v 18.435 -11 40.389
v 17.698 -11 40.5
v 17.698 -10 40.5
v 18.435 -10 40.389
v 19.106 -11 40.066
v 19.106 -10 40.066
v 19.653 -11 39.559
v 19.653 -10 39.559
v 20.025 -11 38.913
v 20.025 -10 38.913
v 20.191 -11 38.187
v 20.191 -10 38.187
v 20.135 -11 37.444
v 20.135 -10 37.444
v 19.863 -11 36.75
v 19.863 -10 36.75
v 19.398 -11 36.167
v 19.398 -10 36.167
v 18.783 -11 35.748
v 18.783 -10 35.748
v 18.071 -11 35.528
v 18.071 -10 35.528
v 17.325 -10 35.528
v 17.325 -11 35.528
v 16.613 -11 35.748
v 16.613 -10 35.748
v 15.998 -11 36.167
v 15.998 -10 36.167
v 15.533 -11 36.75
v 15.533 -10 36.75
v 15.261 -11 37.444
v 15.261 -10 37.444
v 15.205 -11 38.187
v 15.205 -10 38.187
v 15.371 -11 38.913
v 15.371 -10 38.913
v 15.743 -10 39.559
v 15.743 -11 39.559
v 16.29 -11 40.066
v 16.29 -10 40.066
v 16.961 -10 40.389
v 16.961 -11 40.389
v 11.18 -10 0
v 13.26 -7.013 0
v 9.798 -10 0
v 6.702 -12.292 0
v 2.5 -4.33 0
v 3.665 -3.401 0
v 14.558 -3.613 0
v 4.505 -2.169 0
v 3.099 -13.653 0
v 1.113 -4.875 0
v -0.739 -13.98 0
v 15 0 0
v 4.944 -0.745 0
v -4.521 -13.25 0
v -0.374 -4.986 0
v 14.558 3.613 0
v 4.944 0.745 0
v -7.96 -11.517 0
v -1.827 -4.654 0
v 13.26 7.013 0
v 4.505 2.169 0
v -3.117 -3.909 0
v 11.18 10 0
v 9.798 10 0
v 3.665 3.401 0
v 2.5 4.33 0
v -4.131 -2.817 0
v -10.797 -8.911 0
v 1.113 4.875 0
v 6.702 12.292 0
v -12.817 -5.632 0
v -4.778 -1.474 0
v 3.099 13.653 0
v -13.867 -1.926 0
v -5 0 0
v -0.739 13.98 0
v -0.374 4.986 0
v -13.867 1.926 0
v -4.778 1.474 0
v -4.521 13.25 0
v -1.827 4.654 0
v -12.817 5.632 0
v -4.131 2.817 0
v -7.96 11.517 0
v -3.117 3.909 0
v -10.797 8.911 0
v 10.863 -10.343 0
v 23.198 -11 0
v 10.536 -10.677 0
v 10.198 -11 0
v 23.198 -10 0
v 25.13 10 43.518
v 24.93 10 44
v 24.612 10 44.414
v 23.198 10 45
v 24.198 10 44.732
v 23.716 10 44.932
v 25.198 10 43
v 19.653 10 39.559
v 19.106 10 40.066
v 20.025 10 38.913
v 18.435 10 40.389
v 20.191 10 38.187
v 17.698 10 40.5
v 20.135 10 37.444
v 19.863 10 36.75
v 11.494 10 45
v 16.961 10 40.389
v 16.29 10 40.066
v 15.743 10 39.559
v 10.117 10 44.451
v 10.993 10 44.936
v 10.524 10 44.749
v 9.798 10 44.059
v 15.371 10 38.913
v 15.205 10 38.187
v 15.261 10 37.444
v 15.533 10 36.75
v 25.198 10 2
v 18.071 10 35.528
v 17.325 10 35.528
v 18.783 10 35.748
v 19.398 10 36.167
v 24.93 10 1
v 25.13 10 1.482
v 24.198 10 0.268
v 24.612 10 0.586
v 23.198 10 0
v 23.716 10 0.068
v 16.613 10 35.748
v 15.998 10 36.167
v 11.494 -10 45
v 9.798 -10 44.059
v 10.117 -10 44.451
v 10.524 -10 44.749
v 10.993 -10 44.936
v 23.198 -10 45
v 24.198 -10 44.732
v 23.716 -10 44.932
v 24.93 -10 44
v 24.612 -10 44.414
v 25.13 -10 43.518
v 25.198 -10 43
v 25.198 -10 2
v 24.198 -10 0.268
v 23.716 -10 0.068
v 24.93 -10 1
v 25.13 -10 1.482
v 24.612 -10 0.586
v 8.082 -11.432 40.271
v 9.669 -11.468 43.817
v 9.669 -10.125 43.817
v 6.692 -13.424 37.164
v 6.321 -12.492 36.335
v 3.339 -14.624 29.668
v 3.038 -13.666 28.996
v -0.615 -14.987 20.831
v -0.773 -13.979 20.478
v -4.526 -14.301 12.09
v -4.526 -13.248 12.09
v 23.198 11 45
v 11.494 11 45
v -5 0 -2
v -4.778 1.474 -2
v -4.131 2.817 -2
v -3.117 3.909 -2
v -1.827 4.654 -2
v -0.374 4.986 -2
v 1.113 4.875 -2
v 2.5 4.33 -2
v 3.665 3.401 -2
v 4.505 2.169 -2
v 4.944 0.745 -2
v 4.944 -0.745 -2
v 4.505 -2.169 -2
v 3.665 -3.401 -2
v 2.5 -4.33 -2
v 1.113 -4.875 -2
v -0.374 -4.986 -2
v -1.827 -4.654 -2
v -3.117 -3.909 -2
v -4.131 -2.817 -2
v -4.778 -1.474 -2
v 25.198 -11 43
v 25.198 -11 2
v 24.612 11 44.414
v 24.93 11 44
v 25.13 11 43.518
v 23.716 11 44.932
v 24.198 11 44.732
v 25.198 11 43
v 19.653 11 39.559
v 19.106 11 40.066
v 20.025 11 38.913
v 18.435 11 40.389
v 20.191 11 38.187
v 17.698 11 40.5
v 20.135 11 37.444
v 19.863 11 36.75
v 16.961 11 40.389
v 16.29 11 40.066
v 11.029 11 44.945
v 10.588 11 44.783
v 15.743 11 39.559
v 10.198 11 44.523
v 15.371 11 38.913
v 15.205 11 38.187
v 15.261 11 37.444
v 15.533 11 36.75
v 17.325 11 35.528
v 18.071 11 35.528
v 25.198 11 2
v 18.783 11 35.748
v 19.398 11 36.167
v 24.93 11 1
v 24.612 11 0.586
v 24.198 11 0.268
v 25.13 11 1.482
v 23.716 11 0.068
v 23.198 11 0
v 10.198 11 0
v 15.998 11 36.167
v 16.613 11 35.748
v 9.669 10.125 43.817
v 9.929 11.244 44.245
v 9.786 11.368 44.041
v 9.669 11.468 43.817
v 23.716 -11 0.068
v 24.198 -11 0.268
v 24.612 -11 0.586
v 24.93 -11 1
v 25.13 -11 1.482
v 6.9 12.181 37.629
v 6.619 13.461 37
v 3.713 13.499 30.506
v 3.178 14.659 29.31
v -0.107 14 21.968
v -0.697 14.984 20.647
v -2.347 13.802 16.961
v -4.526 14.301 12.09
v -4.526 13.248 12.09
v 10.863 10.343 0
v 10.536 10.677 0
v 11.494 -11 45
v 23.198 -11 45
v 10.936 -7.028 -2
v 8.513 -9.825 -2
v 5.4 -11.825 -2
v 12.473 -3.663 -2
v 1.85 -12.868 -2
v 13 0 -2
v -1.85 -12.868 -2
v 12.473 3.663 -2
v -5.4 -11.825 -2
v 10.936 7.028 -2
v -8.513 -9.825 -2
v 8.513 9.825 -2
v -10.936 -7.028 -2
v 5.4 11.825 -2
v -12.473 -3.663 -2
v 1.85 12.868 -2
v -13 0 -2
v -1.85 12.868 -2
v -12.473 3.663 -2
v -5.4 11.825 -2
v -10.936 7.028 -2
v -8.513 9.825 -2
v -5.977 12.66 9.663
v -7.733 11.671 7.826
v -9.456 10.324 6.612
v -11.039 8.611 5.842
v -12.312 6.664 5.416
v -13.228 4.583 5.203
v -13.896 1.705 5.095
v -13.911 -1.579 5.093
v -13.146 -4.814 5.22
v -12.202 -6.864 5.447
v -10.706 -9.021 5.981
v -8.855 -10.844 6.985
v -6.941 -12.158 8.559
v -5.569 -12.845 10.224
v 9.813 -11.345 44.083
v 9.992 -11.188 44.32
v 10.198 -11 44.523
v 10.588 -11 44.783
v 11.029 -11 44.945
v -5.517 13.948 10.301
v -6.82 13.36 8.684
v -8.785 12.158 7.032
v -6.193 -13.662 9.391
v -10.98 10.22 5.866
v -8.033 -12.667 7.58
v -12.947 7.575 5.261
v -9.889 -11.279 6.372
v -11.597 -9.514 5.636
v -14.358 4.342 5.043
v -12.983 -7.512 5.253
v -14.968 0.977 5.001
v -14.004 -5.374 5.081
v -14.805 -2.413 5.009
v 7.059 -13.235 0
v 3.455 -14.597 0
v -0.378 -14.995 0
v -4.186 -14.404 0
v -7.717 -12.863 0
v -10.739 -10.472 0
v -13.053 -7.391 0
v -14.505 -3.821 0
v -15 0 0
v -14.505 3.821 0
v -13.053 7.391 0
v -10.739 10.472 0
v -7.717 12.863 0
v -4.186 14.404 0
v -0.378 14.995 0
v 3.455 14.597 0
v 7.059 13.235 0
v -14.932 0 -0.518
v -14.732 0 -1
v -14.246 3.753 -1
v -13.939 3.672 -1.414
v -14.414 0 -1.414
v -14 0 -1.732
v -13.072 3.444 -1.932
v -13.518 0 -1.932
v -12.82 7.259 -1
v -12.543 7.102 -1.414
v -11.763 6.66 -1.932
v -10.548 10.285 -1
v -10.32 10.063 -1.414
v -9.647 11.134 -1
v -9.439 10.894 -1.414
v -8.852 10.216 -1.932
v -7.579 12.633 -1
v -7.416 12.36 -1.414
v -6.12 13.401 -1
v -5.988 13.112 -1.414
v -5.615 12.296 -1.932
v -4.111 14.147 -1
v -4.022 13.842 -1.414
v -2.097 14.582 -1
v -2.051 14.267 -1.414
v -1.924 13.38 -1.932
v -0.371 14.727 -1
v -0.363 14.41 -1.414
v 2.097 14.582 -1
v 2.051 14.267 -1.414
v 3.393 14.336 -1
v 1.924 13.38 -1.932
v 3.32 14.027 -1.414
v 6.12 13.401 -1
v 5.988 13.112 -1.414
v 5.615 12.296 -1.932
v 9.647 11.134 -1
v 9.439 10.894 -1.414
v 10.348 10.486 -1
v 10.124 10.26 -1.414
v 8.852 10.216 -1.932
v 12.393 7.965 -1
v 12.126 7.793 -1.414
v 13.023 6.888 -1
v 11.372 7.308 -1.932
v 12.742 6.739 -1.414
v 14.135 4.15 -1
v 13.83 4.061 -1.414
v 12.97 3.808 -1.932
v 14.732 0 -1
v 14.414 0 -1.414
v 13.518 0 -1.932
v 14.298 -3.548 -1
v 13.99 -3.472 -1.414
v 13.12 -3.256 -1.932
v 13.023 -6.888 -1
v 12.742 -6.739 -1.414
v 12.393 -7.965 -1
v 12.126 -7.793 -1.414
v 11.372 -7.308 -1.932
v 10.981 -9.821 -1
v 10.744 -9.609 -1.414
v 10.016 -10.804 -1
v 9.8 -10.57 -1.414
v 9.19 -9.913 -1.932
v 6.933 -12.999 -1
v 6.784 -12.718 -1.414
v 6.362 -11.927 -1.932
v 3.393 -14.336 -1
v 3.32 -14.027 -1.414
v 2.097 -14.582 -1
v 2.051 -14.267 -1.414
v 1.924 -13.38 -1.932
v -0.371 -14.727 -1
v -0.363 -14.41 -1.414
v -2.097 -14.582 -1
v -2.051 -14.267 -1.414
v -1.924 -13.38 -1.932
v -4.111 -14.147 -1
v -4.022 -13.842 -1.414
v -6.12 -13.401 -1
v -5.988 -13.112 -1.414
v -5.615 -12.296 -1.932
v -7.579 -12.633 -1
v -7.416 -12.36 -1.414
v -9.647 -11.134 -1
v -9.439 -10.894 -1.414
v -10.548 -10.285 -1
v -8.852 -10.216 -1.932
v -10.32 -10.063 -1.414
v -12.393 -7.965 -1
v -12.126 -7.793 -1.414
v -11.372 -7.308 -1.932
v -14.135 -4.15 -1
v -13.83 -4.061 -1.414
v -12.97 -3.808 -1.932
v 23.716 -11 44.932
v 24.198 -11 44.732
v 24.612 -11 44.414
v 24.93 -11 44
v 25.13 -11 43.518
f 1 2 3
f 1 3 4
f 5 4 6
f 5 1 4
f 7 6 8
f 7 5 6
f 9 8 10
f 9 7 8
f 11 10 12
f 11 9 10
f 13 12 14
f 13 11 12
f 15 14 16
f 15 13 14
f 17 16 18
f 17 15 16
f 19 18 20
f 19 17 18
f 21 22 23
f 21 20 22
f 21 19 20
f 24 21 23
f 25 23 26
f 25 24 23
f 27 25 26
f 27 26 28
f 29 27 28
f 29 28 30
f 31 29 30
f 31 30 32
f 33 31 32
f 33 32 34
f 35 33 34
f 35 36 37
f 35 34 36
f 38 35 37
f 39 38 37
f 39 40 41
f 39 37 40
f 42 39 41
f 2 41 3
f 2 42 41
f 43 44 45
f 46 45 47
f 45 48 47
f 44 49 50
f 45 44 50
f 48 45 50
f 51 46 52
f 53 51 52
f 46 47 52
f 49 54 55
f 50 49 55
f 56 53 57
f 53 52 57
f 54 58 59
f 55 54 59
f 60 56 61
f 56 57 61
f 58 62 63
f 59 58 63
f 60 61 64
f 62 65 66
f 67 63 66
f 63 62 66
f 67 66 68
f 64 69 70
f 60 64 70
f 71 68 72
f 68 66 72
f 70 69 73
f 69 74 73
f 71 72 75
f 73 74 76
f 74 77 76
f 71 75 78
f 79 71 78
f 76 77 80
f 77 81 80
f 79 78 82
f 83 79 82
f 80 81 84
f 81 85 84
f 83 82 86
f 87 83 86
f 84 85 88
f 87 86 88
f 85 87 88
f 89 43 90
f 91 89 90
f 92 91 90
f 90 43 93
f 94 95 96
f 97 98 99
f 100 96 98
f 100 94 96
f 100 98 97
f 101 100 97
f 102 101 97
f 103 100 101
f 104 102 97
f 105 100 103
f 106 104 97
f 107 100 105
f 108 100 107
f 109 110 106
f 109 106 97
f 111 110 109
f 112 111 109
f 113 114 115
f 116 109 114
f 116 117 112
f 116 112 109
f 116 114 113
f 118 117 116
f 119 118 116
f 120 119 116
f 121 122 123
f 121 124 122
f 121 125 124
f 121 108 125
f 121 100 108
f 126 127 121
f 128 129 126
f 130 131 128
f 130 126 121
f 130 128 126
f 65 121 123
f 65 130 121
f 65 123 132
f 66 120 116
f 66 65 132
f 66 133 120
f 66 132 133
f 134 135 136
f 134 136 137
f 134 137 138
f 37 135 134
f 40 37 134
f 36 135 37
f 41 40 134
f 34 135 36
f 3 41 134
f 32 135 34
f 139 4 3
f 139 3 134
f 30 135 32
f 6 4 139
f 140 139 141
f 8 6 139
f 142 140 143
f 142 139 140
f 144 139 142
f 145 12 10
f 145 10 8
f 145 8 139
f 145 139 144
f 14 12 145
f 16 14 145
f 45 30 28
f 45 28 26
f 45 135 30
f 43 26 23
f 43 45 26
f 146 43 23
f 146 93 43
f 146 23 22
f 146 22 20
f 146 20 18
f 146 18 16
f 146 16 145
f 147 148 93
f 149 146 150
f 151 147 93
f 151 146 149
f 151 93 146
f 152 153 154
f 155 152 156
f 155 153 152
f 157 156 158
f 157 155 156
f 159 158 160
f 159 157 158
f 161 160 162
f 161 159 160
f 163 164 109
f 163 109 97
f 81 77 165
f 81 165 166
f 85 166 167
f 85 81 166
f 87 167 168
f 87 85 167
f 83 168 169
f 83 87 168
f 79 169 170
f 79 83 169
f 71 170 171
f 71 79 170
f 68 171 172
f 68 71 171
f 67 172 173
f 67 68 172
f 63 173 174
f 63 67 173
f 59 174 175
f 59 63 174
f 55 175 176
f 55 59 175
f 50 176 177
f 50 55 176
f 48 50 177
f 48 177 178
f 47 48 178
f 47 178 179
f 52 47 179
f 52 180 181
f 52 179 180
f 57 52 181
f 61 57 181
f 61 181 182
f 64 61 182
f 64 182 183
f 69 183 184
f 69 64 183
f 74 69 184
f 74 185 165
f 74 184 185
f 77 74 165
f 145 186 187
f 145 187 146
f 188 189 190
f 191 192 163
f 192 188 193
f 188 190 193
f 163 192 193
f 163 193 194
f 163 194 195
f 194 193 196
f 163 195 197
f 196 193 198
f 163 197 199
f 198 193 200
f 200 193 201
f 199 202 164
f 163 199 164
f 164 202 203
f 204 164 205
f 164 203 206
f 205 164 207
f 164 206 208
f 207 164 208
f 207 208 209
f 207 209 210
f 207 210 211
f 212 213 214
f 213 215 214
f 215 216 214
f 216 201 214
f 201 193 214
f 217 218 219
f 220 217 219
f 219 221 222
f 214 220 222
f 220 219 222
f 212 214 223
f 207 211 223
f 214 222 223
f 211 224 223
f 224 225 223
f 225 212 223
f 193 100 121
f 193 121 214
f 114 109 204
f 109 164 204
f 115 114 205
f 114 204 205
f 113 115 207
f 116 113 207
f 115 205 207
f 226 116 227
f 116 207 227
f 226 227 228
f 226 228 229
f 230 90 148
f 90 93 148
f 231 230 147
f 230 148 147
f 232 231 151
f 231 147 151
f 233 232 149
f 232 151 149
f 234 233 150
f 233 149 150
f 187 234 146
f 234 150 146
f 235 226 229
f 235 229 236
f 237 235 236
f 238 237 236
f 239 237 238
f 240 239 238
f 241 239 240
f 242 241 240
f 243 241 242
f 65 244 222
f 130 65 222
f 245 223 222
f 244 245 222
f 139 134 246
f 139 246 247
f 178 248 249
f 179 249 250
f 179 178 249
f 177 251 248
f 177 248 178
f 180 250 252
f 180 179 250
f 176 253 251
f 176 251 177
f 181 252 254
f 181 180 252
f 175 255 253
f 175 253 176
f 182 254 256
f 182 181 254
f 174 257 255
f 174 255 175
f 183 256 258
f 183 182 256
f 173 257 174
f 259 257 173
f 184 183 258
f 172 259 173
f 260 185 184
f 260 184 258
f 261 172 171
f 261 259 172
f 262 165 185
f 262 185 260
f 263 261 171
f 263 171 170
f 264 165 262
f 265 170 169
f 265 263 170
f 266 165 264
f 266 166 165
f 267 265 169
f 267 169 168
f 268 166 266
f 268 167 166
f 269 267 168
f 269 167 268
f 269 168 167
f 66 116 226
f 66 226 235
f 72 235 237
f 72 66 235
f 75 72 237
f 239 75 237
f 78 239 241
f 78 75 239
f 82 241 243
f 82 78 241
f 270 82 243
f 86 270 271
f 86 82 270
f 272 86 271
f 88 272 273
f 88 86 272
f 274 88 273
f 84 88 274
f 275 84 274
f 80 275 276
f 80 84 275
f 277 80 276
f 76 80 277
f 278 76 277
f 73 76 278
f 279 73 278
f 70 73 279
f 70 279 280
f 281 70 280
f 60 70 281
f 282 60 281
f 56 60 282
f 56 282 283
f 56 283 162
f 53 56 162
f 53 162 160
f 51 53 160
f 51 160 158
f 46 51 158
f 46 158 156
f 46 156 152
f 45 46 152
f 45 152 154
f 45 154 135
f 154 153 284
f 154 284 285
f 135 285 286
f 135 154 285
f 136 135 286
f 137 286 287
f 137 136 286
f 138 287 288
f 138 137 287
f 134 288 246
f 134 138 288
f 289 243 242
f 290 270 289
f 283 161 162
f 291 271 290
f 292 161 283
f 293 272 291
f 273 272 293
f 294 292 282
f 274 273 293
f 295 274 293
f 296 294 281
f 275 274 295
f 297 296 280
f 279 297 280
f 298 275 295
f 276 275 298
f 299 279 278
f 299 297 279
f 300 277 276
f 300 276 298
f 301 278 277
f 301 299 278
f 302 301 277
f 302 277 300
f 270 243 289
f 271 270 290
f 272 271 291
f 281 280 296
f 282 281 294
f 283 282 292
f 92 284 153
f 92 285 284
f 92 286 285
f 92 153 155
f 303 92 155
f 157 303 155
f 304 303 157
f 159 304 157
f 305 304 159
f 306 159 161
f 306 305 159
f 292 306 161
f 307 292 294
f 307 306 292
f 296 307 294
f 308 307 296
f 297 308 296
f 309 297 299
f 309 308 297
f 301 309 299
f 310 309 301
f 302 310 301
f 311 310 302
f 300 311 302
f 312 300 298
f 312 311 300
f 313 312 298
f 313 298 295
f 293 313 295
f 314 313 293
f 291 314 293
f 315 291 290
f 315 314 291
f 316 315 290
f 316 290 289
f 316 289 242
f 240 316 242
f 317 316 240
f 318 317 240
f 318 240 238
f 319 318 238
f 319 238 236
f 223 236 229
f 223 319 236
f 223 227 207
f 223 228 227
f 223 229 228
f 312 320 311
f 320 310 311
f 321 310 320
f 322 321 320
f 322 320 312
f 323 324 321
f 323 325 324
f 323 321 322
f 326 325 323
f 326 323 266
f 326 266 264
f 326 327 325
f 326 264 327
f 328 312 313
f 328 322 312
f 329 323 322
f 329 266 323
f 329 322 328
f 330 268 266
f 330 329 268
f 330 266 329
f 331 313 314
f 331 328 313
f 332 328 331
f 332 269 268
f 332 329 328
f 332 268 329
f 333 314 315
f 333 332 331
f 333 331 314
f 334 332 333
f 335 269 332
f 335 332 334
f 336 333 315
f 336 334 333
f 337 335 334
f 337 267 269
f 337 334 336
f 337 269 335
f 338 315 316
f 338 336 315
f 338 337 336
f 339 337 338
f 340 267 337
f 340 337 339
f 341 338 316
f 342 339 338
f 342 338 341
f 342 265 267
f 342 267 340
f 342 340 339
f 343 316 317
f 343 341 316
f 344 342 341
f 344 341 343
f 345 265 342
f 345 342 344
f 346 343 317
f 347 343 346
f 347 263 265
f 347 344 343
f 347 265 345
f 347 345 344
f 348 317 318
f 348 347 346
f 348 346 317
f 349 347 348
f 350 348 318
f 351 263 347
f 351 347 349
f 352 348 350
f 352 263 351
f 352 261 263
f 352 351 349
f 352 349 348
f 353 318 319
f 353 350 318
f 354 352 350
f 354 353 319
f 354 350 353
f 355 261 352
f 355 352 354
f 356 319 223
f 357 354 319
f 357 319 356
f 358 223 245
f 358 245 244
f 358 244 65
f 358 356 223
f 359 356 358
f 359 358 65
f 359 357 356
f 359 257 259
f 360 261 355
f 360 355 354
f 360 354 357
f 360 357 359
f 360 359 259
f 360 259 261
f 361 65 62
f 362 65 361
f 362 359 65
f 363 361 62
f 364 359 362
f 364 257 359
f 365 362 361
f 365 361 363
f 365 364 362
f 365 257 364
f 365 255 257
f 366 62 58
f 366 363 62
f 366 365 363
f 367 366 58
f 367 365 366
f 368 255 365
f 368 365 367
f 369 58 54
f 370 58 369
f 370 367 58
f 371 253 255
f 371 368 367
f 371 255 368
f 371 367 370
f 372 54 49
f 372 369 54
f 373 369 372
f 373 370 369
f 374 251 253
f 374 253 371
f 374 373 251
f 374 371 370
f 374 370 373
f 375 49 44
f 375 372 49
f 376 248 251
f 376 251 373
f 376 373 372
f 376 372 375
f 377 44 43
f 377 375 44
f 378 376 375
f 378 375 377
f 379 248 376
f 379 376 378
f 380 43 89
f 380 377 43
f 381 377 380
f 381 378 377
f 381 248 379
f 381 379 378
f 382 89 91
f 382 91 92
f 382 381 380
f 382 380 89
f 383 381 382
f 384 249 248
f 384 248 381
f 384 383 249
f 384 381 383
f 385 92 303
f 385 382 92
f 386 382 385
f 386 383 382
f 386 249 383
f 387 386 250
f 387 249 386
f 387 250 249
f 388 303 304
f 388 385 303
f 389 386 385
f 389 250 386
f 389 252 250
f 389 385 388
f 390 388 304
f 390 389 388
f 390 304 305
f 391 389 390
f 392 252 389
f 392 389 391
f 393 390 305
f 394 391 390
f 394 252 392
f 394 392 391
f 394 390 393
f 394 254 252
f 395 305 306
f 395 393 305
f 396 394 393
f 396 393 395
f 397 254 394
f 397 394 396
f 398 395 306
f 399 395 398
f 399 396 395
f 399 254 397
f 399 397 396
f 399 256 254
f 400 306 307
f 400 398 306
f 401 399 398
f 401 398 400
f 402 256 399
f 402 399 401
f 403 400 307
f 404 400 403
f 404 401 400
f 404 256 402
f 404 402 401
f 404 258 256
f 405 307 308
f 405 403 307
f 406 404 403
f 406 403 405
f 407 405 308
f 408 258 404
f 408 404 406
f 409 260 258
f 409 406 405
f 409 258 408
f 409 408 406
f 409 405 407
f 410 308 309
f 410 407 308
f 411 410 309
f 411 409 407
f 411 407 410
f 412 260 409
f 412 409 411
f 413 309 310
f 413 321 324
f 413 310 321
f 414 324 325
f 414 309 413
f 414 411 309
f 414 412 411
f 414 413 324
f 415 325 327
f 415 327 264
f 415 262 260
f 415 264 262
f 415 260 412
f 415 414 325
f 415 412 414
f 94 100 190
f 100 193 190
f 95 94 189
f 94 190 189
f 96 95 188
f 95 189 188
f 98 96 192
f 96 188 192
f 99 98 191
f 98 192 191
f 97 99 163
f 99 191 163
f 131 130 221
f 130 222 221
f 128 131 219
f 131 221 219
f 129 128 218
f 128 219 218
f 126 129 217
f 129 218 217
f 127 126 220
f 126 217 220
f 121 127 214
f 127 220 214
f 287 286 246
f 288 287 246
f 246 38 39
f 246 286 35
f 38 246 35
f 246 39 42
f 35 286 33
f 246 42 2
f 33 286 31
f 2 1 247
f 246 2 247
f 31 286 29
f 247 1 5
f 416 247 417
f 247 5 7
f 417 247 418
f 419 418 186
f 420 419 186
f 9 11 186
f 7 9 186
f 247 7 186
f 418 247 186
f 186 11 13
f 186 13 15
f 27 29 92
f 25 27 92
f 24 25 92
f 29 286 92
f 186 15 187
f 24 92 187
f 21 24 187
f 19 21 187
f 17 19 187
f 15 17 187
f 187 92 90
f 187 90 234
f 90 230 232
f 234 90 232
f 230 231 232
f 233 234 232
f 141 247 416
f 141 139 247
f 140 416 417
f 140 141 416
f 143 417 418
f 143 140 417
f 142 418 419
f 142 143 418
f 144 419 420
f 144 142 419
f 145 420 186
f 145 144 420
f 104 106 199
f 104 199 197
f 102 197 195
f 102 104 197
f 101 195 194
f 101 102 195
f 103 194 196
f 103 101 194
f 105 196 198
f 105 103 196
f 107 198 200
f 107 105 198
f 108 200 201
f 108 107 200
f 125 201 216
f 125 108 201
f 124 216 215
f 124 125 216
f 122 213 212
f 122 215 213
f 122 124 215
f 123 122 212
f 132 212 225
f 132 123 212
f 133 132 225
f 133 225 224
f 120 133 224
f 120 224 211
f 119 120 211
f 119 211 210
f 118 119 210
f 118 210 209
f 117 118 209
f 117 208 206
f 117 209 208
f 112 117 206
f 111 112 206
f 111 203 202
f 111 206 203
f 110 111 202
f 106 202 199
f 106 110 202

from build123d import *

# Parameters (mm, degrees)
EXTRUDE_1_DEPTH          = 45
SHELL_11_T               = -1
CUT_EXTRUDE_3_DEPTH      = 54.711648372
CUT_EXTRUDE_3_DEPTH_BACK = 54.711648372
CUT_EXTRUDE_5_DEPTH      = 58.757607161
CUT_EXTRUDE_5_DEPTH_BACK = 58.757607161
SKETCH_3_R               = 2.5
EXTRUDE_START            = 2
SKETCH_5_R               = 15
EXTRUDE_4_DEPTH          = 2
FILLET_5_R               = 2
CUT_EXTRUDE_6_DEPTH      = 56.398025084
CUT_EXTRUDE_6_DEPTH_BACK = 56.398025084
SKETCH_6_R               = 5
FILLET_6_R               = 2
FILLET_7_R               = 2


with BuildPart() as part:
    # 草图1 → 凸台-拉伸1 (new body)
    with BuildSketch(Plane.XY):
        with BuildLine():
            Line((10.198039027, -11), (25.198039027, -11))
            Line((25.198039027, -11), (25.198039027, 11))
            Line((25.198039027, 11), (10.198039027, 11))
            ThreePointArc((10.198039027, 11), (-15, 0), (10.198039027, -11))
        make_face()
    extrude(amount=EXTRUDE_1_DEPTH)

    # 抽壳11
    shell_11_openings = [part.faces().sort_by_distance(p)[0] for p in [
        (5.138978192, 0, 45),
        (5.138978192, 0, 0),
        (25.198039027, 0, 22.5),
    ]]
    offset(amount=SHELL_11_T, openings=shell_11_openings, kind=Kind.INTERSECTION)

    # 草图2 → 切除-拉伸3 (cut, two sides: drawn at the far end of the back side and taken through both)
    with BuildSketch(Plane(origin=(0, 0, 0), x_dir=(1, 0, 0), z_dir=(0, 1, 0)).offset(-CUT_EXTRUDE_3_DEPTH_BACK)):
        with BuildLine():
            Line((10.198039027, -45), (-4.526158017, -12.089687708))
            ThreePointArc((-4.526158017, -12.089687708), (-8.753229506, -7.052958097), (-15, -5))
            Line((-15, -5), (-15, -45))
            Line((-15, -45), (10.198039027, -45))
        make_face()
    extrude(amount=CUT_EXTRUDE_3_DEPTH + CUT_EXTRUDE_3_DEPTH_BACK, mode=Mode.SUBTRACT)

    # 草图3 → 切除-拉伸5 (cut, two sides: drawn at the far end of the back side and taken through both)
    with BuildSketch(Plane(origin=(0, 11, 0), x_dir=(1, 0, 0), z_dir=(0, 1, 0)).offset(-CUT_EXTRUDE_5_DEPTH_BACK)):
        with Locations(Location((17.698039027, -38, 0), (0, 0, 270))):
            Circle(SKETCH_3_R)
    extrude(amount=CUT_EXTRUDE_5_DEPTH + CUT_EXTRUDE_5_DEPTH_BACK, mode=Mode.SUBTRACT)

    # 草图5 → 凸台-拉伸4 (add)
    with BuildSketch(Plane(origin=(0, 0, 0), x_dir=(-1, 0, 0), z_dir=(0, 0, -1)).offset(EXTRUDE_START)):
        Circle(SKETCH_5_R)
    extrude(amount=-EXTRUDE_4_DEPTH)

    # 圆角5
    # the kernel refuses this fillet: 2 mm, written as the material it takes off along each edge
    with BuildSketch(Plane(origin=(0, 0, -2), x_dir=(-1, 0, 0), z_dir=(0, -1, 0))) as fillet_5_piece_1:
        with BuildLine():
            CenterArc((15 - FILLET_5_R, -FILLET_5_R), FILLET_5_R, 0, 90)
            Line((15 - FILLET_5_R, 0), (15, 0))
            Line((15, 0), (15, -FILLET_5_R))
        make_face()
    revolve(axis=Axis((0, 0, -2), (0, 0, -1)), mode=Mode.SUBTRACT)

    # 草图6 → 切除-拉伸6 (cut, two sides: drawn at the far end of the back side and taken through both)
    with BuildSketch(Plane(origin=(0, 0, -2), x_dir=(-1, 0, 0), z_dir=(0, 0, -1)).offset(-CUT_EXTRUDE_6_DEPTH_BACK)):
        Circle(SKETCH_6_R)
    extrude(amount=CUT_EXTRUDE_6_DEPTH + CUT_EXTRUDE_6_DEPTH_BACK, mode=Mode.SUBTRACT)

    # 圆角6
    fillet_6_edges = [part.edges().sort_by_distance(p)[0] for p in [
        (25.198039027, 10.5, 0),
        (25.198039027, 10.5, 45),
    ]]
    fillet(fillet_6_edges, radius=FILLET_6_R)

    # 圆角7
    fillet_7_edges = [part.edges().sort_by_distance(p)[0] for p in [
        (10.198039027, -10.5, 45),
        (10.198039027, 10.5, 45),
        (25.198039027, -10.5, 0),
        (25.198039027, -10.5, 45),
    ]]
    fillet(fillet_7_edges, radius=FILLET_7_R)


solid = part.part
